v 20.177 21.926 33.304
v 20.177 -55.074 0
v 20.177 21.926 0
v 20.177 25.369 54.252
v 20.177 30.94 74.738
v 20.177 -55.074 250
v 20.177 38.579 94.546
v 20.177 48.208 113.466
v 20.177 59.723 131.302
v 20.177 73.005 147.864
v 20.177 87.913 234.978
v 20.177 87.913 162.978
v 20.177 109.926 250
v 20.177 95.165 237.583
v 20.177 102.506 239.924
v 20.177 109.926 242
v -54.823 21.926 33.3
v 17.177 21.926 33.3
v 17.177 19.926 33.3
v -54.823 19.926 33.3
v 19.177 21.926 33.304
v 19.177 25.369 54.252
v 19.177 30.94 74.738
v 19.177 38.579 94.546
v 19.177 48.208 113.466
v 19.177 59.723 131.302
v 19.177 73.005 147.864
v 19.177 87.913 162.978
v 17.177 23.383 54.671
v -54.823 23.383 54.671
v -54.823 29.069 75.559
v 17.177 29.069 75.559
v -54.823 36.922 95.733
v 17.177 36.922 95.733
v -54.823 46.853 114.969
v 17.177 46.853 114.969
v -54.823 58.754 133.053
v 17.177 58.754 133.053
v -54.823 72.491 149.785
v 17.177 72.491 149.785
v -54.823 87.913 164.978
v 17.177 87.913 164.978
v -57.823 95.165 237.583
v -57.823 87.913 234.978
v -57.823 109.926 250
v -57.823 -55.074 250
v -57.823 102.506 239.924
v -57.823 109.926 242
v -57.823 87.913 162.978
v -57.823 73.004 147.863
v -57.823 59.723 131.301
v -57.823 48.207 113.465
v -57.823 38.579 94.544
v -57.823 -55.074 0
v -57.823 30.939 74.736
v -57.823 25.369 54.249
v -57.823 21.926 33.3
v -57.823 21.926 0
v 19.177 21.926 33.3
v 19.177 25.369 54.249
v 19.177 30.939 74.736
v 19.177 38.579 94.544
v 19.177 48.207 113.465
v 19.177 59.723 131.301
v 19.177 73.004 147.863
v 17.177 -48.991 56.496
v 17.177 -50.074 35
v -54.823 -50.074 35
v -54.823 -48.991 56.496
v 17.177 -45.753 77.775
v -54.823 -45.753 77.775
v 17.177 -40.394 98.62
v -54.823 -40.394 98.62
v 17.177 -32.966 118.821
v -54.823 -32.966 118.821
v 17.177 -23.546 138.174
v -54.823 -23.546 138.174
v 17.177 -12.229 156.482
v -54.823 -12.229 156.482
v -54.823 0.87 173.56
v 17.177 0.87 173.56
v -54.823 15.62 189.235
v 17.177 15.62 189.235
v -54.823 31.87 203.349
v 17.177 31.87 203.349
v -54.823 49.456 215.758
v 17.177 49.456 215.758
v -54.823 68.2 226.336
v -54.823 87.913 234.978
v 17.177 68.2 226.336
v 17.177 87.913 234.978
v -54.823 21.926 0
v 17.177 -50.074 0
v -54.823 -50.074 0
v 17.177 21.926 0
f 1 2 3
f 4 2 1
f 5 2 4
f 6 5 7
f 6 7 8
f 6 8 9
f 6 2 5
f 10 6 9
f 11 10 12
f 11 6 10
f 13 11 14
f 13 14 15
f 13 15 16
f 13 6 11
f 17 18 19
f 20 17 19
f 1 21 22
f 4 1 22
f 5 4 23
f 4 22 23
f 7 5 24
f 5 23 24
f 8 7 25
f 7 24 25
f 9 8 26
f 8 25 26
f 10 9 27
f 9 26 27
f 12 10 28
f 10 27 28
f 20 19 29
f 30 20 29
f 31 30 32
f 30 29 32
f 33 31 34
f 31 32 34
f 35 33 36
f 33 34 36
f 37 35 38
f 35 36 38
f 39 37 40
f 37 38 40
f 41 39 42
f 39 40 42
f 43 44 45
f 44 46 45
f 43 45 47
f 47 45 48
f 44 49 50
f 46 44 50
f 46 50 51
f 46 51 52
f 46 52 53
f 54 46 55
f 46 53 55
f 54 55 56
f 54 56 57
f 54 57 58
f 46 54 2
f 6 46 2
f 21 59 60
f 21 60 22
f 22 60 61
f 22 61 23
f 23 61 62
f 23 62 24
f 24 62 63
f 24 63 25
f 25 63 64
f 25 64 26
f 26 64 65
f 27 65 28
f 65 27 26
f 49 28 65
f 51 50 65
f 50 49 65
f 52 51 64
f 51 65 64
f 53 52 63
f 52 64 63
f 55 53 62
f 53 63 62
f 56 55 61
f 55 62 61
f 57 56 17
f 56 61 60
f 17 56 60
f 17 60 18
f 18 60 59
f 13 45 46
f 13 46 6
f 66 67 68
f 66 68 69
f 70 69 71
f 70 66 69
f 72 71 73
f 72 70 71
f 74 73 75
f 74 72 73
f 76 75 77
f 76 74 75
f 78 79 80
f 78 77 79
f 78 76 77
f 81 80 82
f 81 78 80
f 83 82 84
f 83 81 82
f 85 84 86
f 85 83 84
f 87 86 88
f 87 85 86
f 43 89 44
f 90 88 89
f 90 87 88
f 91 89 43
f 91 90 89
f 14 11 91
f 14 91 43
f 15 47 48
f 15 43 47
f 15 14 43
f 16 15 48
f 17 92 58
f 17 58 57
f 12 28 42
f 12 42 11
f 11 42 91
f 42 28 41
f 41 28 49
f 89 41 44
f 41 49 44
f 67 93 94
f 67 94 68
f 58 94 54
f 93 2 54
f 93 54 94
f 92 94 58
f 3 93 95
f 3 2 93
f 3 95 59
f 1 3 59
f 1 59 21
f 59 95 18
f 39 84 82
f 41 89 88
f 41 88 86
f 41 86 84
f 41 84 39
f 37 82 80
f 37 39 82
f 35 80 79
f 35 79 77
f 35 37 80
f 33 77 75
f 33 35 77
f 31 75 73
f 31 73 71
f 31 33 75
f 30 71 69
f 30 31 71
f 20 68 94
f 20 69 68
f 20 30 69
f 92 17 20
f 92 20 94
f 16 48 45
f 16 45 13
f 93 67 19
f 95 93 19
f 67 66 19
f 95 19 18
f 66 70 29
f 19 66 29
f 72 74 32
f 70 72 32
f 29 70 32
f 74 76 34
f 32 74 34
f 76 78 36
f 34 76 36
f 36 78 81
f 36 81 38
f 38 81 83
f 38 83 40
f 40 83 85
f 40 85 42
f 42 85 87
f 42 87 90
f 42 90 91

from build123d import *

# Parameters (mm, degrees)
ESQUISSE1_W                  = 78
ESQUISSE1_H                  = 165
BOSS_EXTRU_1_DEPTH           = 250
ENL_V_MAT_EXTRU_1_DEPTH      = 285.020723146
ENL_V_MAT_EXTRU_1_DEPTH_BACK = 78
BOSS_EXTRU_4_START           = 17.177257831
BOSS_EXTRU_4_DEPTH           = 3
BOSS_EXTRU_5_START           = -3
BOSS_EXTRU_5_DEPTH           = 3
BOSS_EXTRU_9_START           = 74
BOSS_EXTRU_9_DEPTH           = 74


# Read off the part's stored shape, not the designer's step: Boss.-Extru.4
with BuildPart() as part:
    # Esquisse1 → Boss.-Extru.1 (new body)
    with BuildSketch(Plane.XY):
        with Locations((-18.822742169, 27.426207869)):
            Rectangle(ESQUISSE1_W, ESQUISSE1_H)
    extrude(amount=BOSS_EXTRU_1_DEPTH)

    # Esquisse2 → Enlèv. mat.-Extru.1 (cut, two sides: drawn at the far end of the back side and taken through both)
    with BuildSketch(Plane.ZY.offset(57.822742169).offset(-ENL_V_MAT_EXTRU_1_DEPTH_BACK)):
        with BuildLine():
            Line((0, -664.156424161), (0, -55.073792131))
            Line((0, -55.073792131), (0, -50.073792131))
            Line((0, -50.073792131), (35, -50.073792131))
            ThreePointArc((35, -50.073792131), (165.813798966, -5.411019544), (242, 109.926207869))
            Line((242, 109.926207869), (395.487506317, 699.35240176))
            Line((395.487506317, 699.35240176), (-774.457853053, 1038.696573142))
            Line((-774.457853053, 1038.696573142), (-1169.94535937, -324.812252779))
            Line((-1169.94535937, -324.812252779), (0, -664.156424161))
        make_face()
    extrude(amount=ENL_V_MAT_EXTRU_1_DEPTH + ENL_V_MAT_EXTRU_1_DEPTH_BACK, mode=Mode.SUBTRACT)

    # Boss.-Extru.4 outline → Boss.-Extru.4 (add)
    with BuildSketch(Plane.YZ.offset(BOSS_EXTRU_4_START)):
        with BuildLine():
            Line((-50.073792131, 0), (21.926207869, 0))
            Line((21.926207869, 0), (21.926207869, 33.303690661))
            ThreePointArc((21.926207869, 33.303690661), (43.150814353, 104.129560556), (87.912843237, 162.978082516))
            Line((87.912843237, 162.978082516), (87.912843237, 234.978082516))
            ThreePointArc((87.912843237, 234.978082516), (-12.229352313, 156.482040882), (-50.073792131, 35))
            Line((-50.073792131, 35), (-50.073792131, 0))
        make_face()
    extrude(amount=BOSS_EXTRU_4_DEPTH)

    # Esquisse7 → Boss.-Extru.5 (add)
    with BuildSketch(Plane.ZY.offset(57.822742169).offset(BOSS_EXTRU_5_START)):
        with BuildLine():
            Line((0, -50.073792131), (0, 21.926207869))
            Line((0, 21.926207869), (33.3, 21.926207869))
            ThreePointArc((33.3, 21.926207869), (104.127859837, 43.15019521), (162.978082516, 87.912843237))
            Line((162.978082516, 87.912843237), (234.978082516, 87.912843237))
            ThreePointArc((234.978082516, 87.912843237), (156.482040881, -12.229352313), (35, -50.073792131))
            Line((35, -50.073792131), (0, -50.073792131))
        make_face()
    extrude(amount=BOSS_EXTRU_5_DEPTH)

    # Esquisse22 → Boss.-Extru.9 (add)
    with BuildSketch(Plane(origin=(-54.822742169, 0, 0), x_dir=(0, 0, -1), z_dir=(1, 0, 0)).offset(BOSS_EXTRU_9_START)):
        with BuildLine():
            Line((-33.3, 21.926207869), (-33.3, 19.926207869))
            ThreePointArc((-33.3, 19.926207869), (-105.482114961, 41.634114192), (-164.978082516, 87.912843237))
            Line((-164.978082516, 87.912843237), (-162.978082516, 87.912843237))
            ThreePointArc((-162.978082516, 87.912843237), (-104.127859837, 43.15019521), (-33.3, 21.926207869))
        make_face()
    extrude(amount=-BOSS_EXTRU_9_DEPTH)


solid = part.part
